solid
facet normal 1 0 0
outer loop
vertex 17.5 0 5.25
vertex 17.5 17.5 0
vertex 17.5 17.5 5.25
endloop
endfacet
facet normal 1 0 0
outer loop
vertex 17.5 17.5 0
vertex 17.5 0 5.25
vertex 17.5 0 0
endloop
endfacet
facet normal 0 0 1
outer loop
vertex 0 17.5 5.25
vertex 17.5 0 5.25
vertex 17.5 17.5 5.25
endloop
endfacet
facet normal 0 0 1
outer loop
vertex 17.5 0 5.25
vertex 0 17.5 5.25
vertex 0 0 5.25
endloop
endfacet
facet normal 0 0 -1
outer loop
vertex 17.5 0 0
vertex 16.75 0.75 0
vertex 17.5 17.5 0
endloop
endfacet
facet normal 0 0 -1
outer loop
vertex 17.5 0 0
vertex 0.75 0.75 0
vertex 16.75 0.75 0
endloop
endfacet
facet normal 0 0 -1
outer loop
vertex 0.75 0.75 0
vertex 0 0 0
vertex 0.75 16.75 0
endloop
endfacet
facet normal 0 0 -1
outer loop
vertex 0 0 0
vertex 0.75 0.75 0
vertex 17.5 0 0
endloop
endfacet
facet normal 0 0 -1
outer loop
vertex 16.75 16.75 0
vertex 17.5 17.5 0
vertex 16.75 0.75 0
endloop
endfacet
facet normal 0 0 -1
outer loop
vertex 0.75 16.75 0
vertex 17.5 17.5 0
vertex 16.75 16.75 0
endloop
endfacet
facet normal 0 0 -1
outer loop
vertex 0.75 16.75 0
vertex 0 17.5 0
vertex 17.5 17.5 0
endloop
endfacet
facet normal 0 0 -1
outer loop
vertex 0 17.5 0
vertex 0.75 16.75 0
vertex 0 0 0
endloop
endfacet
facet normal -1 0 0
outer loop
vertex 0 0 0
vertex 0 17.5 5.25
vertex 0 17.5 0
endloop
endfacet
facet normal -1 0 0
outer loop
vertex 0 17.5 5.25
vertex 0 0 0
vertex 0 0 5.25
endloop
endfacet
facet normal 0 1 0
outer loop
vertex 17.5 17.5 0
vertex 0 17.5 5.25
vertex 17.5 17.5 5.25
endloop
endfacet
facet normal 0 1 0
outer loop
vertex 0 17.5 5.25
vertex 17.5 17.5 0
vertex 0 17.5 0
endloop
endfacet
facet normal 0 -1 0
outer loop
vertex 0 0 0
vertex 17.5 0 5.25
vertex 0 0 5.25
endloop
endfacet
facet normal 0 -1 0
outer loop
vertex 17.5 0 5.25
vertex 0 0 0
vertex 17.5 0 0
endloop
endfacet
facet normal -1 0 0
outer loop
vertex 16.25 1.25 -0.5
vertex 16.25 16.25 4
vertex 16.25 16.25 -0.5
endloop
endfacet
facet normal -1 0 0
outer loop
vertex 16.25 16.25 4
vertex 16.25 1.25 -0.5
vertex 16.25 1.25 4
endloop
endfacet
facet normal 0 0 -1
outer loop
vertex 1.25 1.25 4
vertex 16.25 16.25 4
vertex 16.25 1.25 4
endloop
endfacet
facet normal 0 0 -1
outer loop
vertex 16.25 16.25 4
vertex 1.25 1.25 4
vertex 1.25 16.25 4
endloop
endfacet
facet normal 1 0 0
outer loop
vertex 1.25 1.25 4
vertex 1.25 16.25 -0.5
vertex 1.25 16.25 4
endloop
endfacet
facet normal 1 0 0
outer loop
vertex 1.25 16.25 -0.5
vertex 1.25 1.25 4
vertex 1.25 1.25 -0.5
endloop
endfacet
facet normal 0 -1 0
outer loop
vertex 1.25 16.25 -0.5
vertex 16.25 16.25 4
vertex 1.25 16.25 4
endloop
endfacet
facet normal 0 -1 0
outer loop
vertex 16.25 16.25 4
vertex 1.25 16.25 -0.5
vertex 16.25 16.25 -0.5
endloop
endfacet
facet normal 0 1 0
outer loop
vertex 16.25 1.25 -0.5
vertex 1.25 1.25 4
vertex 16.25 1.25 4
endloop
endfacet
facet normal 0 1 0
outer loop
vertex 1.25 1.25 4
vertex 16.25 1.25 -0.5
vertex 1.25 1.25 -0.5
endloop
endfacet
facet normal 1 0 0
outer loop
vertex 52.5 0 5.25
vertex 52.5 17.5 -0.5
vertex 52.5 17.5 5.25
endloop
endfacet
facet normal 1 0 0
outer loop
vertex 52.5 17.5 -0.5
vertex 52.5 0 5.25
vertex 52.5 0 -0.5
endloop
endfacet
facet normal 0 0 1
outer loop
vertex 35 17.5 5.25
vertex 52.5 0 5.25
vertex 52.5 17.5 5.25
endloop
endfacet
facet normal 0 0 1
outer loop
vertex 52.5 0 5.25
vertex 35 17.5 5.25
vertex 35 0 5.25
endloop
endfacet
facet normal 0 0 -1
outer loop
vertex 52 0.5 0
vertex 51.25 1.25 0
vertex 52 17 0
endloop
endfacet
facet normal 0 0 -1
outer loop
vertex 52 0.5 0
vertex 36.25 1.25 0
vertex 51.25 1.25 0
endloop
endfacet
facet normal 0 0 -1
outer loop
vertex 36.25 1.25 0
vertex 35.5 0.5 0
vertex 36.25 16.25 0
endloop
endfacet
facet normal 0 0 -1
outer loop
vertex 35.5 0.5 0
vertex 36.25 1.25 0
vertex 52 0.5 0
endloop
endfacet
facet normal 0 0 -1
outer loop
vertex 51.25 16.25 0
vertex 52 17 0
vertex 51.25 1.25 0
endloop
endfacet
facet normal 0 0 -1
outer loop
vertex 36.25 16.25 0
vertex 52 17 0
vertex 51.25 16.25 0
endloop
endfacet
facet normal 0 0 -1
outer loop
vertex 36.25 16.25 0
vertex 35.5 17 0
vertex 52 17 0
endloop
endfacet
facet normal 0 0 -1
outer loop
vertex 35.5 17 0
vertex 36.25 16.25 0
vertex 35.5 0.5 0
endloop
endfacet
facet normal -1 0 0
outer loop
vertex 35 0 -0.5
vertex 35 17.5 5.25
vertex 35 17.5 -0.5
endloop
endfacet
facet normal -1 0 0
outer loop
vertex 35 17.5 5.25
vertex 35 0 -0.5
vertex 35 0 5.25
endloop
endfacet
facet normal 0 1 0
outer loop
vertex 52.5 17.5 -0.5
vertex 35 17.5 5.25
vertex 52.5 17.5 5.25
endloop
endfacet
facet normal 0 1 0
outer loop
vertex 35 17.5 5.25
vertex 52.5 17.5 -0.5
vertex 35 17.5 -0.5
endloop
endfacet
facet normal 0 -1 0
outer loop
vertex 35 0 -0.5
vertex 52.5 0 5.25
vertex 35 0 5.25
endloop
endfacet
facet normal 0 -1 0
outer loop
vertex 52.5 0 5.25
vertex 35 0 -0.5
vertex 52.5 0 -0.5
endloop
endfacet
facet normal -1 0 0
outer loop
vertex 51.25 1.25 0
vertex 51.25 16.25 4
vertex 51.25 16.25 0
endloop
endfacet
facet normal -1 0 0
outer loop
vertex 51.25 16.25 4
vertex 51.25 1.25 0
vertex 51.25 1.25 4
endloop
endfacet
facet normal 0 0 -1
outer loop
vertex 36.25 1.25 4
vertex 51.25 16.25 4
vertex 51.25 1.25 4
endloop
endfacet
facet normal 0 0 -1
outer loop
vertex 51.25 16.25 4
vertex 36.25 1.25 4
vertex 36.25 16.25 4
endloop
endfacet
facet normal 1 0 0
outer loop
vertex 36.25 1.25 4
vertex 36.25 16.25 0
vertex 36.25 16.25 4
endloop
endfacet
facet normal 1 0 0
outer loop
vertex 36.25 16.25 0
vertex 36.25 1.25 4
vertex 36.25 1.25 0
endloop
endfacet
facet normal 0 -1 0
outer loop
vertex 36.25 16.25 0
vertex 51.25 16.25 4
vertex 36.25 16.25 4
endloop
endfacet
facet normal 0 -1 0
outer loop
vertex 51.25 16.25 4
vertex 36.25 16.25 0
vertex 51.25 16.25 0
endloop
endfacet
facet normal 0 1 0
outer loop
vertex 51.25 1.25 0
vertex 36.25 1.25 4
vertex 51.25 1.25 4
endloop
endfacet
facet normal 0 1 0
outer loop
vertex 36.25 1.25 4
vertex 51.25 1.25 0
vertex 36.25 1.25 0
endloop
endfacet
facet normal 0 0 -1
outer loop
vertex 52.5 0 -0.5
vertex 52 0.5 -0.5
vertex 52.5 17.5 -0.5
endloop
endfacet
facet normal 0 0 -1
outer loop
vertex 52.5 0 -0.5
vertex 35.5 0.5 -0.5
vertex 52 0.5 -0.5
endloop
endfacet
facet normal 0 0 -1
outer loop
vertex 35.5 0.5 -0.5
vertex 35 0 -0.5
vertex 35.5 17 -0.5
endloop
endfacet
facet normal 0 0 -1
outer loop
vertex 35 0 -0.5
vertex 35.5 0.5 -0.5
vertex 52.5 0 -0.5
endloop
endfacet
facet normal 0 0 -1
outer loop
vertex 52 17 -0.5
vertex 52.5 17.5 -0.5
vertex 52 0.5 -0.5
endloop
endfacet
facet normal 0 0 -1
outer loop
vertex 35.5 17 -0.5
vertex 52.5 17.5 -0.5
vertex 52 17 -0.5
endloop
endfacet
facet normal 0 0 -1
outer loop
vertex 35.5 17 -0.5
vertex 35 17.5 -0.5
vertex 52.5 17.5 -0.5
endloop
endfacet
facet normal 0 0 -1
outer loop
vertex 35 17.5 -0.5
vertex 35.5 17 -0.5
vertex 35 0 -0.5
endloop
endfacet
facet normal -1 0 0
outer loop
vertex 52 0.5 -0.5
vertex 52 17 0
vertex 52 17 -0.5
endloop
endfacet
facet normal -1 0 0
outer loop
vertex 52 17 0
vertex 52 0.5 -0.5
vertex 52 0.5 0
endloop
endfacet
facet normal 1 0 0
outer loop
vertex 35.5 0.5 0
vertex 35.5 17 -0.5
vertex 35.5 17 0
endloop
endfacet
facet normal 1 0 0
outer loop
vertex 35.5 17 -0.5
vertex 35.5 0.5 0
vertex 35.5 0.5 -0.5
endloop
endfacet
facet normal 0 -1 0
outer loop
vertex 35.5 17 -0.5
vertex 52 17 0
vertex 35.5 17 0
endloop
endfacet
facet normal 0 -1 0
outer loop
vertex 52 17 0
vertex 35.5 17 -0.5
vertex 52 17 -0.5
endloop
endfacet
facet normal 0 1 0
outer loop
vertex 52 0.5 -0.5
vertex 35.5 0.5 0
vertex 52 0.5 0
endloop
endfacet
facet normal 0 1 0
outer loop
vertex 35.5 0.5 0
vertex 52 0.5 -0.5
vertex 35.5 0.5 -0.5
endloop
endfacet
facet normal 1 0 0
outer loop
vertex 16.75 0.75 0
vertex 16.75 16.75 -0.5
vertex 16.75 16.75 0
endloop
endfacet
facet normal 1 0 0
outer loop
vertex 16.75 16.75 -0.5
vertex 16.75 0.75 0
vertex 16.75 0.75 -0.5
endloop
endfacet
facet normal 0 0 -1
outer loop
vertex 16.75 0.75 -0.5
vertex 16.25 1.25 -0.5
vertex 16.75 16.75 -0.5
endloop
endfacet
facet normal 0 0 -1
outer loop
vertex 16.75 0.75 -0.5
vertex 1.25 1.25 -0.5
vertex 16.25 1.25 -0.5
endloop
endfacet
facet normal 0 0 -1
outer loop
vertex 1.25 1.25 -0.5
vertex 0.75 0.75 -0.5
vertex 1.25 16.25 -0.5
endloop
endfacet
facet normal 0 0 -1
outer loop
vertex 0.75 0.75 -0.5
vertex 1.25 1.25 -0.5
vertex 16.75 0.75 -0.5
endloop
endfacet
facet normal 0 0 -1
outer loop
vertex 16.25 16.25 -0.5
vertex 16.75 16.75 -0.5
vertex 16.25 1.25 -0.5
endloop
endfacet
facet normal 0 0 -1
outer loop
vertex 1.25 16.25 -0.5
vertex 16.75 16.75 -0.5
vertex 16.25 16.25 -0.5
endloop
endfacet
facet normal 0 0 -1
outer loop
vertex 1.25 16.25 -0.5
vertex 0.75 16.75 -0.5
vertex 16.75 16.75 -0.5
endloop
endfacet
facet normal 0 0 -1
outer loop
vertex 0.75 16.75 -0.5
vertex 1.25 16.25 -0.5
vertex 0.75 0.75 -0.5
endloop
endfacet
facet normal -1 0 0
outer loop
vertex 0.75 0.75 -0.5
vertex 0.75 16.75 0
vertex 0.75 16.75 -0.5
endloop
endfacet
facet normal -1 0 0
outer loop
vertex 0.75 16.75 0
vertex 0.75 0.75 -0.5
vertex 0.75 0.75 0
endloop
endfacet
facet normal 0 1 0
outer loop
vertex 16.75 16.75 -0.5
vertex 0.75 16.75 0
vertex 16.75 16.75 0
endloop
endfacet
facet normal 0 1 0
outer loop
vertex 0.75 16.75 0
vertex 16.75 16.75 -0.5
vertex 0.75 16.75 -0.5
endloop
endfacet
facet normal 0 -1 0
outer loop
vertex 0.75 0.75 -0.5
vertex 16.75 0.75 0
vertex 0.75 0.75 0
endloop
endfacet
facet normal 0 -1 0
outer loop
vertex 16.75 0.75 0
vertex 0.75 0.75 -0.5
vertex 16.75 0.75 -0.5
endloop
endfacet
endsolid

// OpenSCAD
// Parameterized Simple Enclosure Box
// 2014-07-07
// Michael Cumming

$fn = 60;

_innerWidth = 15; //'x' dim = inner cavity height
_innerDepth = 15; //'y' dim = inner cavity height
_innerHeight = 8; //'z' dim = inner cavity height

_wallThickness = 1.25;
_lipGap = 0.25; //gap between inner and outer gap

outerWidth = _innerWidth + (_wallThickness*2);
outerDepth = _innerDepth + (_wallThickness*2);
outerHeight = _innerHeight + (_wallThickness*2);
lipThickness = (_wallThickness-_lipGap)/2;

//--------------------------------------
module outerCubeHalf() {
	cube([outerWidth, outerWidth, outerHeight/2], center = false);
}
module innerCubeHalf() {
	cube([_innerWidth, _innerDepth, _innerHeight/2], center = false);
}

module halfBox() {
	difference() {
		outerCubeHalf();
		translate([_wallThickness, _wallThickness, 0]) innerCubeHalf();
	}
}

module outsideLip() {
	difference() {
		translate([0, 0, -lipThickness])
		cube([outerWidth, outerDepth, lipThickness], center = false);
		//inner cutout
		translate([lipThickness, lipThickness, -lipThickness])
		cube([
			outerWidth-(lipThickness*2), 
			outerDepth-(lipThickness*2), 
			lipThickness], 
			center = false);
	}
}

module insideLip() {
	difference() {
		translate([lipThickness+_lipGap, lipThickness+_lipGap, -lipThickness])
		cube([
		_innerWidth+(lipThickness*2), 
		_innerDepth+(lipThickness*2), 
		lipThickness], 
		center = false);
		//inner cutout
		translate([_wallThickness, _wallThickness, -lipThickness])
		cube([_innerWidth, _innerDepth, lipThickness], center = false);
	}	
}

module topBox() {
	union() {
		halfBox();
		outsideLip();	
	}
}

module bottomBox() {
	union() {
		halfBox();
		insideLip();	
	}
}

translate([outerWidth*2, 0, 0]) topBox();
bottomBox();
//insideLip();
